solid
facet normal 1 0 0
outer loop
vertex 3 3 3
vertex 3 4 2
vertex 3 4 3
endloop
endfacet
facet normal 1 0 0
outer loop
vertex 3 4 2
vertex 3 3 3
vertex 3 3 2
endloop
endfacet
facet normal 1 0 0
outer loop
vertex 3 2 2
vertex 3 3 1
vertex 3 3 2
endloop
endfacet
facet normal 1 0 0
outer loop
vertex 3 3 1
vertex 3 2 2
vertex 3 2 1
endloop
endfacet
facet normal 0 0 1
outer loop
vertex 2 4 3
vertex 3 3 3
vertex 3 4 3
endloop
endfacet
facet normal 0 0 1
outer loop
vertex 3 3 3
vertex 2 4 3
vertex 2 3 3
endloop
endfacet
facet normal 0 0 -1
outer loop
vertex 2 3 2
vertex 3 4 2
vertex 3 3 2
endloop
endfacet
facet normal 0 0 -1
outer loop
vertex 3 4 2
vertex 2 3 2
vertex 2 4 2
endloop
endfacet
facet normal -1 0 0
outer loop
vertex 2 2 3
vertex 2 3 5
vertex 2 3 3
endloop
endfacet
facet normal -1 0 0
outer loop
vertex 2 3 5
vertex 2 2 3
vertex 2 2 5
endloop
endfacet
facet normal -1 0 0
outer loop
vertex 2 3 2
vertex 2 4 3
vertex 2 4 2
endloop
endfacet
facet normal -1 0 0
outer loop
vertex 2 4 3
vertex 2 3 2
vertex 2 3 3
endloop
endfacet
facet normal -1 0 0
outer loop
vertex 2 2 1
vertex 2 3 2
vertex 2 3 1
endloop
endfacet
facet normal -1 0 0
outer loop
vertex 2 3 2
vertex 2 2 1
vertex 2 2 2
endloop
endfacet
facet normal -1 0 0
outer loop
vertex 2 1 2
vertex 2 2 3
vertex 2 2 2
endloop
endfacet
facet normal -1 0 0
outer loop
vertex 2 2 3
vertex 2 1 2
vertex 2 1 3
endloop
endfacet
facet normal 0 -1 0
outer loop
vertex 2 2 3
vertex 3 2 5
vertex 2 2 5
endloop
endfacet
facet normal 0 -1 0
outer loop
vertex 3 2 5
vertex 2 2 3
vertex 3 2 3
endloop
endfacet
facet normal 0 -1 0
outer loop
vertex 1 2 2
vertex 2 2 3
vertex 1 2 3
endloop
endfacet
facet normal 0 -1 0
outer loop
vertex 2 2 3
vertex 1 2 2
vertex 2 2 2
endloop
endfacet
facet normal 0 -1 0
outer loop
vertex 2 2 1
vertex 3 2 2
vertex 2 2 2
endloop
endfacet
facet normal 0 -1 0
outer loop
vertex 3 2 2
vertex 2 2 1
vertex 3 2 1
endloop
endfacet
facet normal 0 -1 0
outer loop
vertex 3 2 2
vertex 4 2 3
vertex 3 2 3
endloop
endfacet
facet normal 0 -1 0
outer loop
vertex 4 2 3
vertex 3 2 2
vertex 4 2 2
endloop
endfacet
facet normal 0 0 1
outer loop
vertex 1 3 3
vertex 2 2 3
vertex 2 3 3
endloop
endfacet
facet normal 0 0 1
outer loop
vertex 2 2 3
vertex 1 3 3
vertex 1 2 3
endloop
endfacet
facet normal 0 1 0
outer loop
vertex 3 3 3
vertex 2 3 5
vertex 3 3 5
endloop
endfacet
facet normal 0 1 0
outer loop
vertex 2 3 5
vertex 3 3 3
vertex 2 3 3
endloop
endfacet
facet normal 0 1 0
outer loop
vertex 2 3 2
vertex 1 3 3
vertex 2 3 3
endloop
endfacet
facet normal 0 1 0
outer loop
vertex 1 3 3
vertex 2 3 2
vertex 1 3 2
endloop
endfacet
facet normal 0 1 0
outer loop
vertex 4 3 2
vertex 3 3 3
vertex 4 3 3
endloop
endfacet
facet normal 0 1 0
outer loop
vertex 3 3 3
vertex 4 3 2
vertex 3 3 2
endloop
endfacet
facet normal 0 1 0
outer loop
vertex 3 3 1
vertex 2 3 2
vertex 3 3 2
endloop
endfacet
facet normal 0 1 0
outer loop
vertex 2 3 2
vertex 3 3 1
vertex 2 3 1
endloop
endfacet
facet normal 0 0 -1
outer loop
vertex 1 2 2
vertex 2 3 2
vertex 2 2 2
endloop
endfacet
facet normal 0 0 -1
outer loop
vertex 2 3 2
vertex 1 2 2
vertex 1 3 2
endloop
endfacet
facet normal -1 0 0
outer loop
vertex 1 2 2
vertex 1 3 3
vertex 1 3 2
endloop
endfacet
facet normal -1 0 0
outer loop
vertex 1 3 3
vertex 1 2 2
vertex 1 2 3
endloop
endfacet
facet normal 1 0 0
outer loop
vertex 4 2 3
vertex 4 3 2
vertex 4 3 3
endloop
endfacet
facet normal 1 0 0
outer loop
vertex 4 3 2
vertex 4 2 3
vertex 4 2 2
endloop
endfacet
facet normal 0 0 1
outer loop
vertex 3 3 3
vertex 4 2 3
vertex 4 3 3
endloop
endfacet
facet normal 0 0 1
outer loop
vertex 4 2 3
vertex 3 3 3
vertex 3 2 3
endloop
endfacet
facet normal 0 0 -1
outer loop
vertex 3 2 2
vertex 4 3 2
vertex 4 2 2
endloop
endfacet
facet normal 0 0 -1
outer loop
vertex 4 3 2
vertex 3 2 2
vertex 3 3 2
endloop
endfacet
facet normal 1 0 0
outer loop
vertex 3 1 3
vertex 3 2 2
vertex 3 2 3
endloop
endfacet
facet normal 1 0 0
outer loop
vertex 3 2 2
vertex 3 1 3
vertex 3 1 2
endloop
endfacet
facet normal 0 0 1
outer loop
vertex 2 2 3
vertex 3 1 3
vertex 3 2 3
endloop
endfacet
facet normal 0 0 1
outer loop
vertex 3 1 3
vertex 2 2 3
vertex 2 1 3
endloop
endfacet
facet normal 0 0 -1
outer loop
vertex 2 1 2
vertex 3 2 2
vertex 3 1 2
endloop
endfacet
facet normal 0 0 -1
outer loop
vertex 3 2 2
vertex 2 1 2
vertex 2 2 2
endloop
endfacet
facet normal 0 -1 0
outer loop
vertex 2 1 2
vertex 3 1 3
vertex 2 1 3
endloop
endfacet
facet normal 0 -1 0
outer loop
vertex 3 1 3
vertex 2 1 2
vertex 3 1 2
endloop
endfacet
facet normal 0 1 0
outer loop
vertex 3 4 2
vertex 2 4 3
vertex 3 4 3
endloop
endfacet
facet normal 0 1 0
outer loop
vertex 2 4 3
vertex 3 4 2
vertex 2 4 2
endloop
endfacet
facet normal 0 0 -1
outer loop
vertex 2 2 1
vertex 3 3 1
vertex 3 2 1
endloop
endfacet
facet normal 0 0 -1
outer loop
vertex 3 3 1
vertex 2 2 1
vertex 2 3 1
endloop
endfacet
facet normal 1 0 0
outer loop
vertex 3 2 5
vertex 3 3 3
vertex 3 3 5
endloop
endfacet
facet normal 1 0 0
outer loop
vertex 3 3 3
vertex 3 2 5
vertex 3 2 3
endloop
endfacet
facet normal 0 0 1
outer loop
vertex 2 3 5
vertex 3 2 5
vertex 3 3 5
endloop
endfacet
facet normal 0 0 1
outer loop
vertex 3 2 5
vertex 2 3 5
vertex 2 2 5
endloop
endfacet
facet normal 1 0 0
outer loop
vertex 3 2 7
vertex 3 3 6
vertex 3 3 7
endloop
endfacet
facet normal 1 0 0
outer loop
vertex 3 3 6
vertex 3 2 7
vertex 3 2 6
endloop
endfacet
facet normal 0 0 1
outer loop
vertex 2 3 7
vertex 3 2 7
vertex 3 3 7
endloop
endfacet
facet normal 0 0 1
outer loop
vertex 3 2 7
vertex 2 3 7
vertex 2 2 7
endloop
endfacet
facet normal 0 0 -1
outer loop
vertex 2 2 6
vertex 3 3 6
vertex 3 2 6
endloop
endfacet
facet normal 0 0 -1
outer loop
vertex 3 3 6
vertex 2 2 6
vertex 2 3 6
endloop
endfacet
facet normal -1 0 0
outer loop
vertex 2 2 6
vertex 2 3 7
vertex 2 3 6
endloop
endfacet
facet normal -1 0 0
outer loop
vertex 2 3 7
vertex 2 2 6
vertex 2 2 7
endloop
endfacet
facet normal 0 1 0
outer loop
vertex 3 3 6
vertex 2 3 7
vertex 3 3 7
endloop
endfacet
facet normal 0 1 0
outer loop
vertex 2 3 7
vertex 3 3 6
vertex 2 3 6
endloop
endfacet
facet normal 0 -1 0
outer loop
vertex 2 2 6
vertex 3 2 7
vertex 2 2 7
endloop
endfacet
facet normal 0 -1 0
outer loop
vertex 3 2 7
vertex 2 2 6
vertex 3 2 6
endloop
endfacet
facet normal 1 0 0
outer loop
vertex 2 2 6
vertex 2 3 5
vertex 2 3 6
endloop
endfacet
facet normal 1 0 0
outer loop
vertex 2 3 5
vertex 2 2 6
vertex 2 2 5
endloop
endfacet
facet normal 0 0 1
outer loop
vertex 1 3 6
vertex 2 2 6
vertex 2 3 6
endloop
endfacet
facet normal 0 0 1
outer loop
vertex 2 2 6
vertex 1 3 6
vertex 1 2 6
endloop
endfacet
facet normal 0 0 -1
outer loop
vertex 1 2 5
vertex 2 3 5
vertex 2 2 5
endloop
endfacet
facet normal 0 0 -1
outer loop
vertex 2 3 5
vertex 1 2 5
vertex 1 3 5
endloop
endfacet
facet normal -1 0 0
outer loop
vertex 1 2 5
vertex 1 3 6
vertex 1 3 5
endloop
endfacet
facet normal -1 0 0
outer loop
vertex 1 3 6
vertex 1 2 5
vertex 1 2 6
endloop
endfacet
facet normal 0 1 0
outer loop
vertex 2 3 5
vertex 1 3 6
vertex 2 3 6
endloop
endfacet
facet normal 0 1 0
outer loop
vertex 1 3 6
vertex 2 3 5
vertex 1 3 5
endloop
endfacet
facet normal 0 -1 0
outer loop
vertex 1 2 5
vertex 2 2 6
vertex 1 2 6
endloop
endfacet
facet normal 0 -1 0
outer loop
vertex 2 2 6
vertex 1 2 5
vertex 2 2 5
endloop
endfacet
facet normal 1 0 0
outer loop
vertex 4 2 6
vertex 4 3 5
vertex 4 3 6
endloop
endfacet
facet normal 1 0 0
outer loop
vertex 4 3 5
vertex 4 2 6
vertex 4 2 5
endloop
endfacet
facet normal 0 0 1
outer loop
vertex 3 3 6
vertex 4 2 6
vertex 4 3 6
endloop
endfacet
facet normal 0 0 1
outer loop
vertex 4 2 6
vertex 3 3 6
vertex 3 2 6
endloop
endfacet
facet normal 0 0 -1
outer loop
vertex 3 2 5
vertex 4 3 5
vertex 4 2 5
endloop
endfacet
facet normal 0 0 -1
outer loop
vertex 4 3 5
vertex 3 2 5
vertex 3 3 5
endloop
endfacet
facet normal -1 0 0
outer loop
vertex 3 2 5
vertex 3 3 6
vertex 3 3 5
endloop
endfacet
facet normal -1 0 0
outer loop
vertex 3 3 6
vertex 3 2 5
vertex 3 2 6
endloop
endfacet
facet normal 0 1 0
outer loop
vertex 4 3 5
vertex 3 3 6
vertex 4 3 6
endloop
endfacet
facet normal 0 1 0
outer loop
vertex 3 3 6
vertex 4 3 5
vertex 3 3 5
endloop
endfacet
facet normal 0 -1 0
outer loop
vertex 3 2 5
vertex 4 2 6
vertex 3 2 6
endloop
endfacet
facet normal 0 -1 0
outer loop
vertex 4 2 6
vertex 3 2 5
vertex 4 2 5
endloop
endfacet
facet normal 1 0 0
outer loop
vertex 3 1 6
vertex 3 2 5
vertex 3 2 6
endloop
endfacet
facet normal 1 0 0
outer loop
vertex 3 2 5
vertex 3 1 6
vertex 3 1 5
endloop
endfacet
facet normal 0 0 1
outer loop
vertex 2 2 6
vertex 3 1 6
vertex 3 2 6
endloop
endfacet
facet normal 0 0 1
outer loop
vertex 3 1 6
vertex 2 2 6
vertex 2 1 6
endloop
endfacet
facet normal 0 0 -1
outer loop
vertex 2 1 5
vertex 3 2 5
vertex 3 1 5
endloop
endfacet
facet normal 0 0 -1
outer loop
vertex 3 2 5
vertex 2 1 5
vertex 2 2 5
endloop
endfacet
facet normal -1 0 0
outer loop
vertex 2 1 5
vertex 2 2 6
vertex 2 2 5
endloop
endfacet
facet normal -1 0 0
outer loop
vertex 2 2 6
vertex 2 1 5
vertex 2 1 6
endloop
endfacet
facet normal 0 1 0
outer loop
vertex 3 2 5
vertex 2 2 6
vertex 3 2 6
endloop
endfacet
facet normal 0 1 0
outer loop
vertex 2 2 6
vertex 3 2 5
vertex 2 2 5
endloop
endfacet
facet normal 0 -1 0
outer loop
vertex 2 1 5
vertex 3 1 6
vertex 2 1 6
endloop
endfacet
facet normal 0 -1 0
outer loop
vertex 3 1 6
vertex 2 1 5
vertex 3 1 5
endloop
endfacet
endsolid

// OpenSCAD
translate([2, 2, 2]) cube(1);
translate([2, 2, 2]) cube(1);
translate([2, 2, 2]) cube(1);
translate([1, 2, 2]) cube(1);
translate([1, 2, 2]) cube(1);
translate([1, 2, 2]) cube(1);
translate([3, 2, 2]) cube(1);
translate([3, 2, 2]) cube(1);
translate([3, 2, 2]) cube(1);
translate([2, 1, 2]) cube(1);
translate([2, 1, 2]) cube(1);
translate([2, 1, 2]) cube(1);
translate([2, 3, 2]) cube(1);
translate([2, 3, 2]) cube(1);
translate([2, 3, 2]) cube(1);
translate([2, 2, 1]) cube(1);
translate([2, 2, 1]) cube(1);
translate([2, 2, 1]) cube(1);
translate([2, 2, 3]) cube(1);
translate([2, 2, 3]) cube(1);
translate([2, 2, 3]) cube(1);
translate([2, 2, 4]) cube(1);
translate([2, 2, 4]) cube(1);
translate([2, 2, 4]) cube(1);
translate([2, 2, 6]) cube(1);
translate([2, 2, 6]) cube(1);
translate([2, 2, 6]) cube(1);
translate([1, 2, 5]) cube(1);
translate([1, 2, 5]) cube(1);
translate([1, 2, 5]) cube(1);
translate([3, 2, 5]) cube(1);
translate([3, 2, 5]) cube(1);
translate([3, 2, 5]) cube(1);
translate([2, 1, 5]) cube(1);
translate([2, 1, 5]) cube(1);
translate([2, 1, 5]) cube(1);
